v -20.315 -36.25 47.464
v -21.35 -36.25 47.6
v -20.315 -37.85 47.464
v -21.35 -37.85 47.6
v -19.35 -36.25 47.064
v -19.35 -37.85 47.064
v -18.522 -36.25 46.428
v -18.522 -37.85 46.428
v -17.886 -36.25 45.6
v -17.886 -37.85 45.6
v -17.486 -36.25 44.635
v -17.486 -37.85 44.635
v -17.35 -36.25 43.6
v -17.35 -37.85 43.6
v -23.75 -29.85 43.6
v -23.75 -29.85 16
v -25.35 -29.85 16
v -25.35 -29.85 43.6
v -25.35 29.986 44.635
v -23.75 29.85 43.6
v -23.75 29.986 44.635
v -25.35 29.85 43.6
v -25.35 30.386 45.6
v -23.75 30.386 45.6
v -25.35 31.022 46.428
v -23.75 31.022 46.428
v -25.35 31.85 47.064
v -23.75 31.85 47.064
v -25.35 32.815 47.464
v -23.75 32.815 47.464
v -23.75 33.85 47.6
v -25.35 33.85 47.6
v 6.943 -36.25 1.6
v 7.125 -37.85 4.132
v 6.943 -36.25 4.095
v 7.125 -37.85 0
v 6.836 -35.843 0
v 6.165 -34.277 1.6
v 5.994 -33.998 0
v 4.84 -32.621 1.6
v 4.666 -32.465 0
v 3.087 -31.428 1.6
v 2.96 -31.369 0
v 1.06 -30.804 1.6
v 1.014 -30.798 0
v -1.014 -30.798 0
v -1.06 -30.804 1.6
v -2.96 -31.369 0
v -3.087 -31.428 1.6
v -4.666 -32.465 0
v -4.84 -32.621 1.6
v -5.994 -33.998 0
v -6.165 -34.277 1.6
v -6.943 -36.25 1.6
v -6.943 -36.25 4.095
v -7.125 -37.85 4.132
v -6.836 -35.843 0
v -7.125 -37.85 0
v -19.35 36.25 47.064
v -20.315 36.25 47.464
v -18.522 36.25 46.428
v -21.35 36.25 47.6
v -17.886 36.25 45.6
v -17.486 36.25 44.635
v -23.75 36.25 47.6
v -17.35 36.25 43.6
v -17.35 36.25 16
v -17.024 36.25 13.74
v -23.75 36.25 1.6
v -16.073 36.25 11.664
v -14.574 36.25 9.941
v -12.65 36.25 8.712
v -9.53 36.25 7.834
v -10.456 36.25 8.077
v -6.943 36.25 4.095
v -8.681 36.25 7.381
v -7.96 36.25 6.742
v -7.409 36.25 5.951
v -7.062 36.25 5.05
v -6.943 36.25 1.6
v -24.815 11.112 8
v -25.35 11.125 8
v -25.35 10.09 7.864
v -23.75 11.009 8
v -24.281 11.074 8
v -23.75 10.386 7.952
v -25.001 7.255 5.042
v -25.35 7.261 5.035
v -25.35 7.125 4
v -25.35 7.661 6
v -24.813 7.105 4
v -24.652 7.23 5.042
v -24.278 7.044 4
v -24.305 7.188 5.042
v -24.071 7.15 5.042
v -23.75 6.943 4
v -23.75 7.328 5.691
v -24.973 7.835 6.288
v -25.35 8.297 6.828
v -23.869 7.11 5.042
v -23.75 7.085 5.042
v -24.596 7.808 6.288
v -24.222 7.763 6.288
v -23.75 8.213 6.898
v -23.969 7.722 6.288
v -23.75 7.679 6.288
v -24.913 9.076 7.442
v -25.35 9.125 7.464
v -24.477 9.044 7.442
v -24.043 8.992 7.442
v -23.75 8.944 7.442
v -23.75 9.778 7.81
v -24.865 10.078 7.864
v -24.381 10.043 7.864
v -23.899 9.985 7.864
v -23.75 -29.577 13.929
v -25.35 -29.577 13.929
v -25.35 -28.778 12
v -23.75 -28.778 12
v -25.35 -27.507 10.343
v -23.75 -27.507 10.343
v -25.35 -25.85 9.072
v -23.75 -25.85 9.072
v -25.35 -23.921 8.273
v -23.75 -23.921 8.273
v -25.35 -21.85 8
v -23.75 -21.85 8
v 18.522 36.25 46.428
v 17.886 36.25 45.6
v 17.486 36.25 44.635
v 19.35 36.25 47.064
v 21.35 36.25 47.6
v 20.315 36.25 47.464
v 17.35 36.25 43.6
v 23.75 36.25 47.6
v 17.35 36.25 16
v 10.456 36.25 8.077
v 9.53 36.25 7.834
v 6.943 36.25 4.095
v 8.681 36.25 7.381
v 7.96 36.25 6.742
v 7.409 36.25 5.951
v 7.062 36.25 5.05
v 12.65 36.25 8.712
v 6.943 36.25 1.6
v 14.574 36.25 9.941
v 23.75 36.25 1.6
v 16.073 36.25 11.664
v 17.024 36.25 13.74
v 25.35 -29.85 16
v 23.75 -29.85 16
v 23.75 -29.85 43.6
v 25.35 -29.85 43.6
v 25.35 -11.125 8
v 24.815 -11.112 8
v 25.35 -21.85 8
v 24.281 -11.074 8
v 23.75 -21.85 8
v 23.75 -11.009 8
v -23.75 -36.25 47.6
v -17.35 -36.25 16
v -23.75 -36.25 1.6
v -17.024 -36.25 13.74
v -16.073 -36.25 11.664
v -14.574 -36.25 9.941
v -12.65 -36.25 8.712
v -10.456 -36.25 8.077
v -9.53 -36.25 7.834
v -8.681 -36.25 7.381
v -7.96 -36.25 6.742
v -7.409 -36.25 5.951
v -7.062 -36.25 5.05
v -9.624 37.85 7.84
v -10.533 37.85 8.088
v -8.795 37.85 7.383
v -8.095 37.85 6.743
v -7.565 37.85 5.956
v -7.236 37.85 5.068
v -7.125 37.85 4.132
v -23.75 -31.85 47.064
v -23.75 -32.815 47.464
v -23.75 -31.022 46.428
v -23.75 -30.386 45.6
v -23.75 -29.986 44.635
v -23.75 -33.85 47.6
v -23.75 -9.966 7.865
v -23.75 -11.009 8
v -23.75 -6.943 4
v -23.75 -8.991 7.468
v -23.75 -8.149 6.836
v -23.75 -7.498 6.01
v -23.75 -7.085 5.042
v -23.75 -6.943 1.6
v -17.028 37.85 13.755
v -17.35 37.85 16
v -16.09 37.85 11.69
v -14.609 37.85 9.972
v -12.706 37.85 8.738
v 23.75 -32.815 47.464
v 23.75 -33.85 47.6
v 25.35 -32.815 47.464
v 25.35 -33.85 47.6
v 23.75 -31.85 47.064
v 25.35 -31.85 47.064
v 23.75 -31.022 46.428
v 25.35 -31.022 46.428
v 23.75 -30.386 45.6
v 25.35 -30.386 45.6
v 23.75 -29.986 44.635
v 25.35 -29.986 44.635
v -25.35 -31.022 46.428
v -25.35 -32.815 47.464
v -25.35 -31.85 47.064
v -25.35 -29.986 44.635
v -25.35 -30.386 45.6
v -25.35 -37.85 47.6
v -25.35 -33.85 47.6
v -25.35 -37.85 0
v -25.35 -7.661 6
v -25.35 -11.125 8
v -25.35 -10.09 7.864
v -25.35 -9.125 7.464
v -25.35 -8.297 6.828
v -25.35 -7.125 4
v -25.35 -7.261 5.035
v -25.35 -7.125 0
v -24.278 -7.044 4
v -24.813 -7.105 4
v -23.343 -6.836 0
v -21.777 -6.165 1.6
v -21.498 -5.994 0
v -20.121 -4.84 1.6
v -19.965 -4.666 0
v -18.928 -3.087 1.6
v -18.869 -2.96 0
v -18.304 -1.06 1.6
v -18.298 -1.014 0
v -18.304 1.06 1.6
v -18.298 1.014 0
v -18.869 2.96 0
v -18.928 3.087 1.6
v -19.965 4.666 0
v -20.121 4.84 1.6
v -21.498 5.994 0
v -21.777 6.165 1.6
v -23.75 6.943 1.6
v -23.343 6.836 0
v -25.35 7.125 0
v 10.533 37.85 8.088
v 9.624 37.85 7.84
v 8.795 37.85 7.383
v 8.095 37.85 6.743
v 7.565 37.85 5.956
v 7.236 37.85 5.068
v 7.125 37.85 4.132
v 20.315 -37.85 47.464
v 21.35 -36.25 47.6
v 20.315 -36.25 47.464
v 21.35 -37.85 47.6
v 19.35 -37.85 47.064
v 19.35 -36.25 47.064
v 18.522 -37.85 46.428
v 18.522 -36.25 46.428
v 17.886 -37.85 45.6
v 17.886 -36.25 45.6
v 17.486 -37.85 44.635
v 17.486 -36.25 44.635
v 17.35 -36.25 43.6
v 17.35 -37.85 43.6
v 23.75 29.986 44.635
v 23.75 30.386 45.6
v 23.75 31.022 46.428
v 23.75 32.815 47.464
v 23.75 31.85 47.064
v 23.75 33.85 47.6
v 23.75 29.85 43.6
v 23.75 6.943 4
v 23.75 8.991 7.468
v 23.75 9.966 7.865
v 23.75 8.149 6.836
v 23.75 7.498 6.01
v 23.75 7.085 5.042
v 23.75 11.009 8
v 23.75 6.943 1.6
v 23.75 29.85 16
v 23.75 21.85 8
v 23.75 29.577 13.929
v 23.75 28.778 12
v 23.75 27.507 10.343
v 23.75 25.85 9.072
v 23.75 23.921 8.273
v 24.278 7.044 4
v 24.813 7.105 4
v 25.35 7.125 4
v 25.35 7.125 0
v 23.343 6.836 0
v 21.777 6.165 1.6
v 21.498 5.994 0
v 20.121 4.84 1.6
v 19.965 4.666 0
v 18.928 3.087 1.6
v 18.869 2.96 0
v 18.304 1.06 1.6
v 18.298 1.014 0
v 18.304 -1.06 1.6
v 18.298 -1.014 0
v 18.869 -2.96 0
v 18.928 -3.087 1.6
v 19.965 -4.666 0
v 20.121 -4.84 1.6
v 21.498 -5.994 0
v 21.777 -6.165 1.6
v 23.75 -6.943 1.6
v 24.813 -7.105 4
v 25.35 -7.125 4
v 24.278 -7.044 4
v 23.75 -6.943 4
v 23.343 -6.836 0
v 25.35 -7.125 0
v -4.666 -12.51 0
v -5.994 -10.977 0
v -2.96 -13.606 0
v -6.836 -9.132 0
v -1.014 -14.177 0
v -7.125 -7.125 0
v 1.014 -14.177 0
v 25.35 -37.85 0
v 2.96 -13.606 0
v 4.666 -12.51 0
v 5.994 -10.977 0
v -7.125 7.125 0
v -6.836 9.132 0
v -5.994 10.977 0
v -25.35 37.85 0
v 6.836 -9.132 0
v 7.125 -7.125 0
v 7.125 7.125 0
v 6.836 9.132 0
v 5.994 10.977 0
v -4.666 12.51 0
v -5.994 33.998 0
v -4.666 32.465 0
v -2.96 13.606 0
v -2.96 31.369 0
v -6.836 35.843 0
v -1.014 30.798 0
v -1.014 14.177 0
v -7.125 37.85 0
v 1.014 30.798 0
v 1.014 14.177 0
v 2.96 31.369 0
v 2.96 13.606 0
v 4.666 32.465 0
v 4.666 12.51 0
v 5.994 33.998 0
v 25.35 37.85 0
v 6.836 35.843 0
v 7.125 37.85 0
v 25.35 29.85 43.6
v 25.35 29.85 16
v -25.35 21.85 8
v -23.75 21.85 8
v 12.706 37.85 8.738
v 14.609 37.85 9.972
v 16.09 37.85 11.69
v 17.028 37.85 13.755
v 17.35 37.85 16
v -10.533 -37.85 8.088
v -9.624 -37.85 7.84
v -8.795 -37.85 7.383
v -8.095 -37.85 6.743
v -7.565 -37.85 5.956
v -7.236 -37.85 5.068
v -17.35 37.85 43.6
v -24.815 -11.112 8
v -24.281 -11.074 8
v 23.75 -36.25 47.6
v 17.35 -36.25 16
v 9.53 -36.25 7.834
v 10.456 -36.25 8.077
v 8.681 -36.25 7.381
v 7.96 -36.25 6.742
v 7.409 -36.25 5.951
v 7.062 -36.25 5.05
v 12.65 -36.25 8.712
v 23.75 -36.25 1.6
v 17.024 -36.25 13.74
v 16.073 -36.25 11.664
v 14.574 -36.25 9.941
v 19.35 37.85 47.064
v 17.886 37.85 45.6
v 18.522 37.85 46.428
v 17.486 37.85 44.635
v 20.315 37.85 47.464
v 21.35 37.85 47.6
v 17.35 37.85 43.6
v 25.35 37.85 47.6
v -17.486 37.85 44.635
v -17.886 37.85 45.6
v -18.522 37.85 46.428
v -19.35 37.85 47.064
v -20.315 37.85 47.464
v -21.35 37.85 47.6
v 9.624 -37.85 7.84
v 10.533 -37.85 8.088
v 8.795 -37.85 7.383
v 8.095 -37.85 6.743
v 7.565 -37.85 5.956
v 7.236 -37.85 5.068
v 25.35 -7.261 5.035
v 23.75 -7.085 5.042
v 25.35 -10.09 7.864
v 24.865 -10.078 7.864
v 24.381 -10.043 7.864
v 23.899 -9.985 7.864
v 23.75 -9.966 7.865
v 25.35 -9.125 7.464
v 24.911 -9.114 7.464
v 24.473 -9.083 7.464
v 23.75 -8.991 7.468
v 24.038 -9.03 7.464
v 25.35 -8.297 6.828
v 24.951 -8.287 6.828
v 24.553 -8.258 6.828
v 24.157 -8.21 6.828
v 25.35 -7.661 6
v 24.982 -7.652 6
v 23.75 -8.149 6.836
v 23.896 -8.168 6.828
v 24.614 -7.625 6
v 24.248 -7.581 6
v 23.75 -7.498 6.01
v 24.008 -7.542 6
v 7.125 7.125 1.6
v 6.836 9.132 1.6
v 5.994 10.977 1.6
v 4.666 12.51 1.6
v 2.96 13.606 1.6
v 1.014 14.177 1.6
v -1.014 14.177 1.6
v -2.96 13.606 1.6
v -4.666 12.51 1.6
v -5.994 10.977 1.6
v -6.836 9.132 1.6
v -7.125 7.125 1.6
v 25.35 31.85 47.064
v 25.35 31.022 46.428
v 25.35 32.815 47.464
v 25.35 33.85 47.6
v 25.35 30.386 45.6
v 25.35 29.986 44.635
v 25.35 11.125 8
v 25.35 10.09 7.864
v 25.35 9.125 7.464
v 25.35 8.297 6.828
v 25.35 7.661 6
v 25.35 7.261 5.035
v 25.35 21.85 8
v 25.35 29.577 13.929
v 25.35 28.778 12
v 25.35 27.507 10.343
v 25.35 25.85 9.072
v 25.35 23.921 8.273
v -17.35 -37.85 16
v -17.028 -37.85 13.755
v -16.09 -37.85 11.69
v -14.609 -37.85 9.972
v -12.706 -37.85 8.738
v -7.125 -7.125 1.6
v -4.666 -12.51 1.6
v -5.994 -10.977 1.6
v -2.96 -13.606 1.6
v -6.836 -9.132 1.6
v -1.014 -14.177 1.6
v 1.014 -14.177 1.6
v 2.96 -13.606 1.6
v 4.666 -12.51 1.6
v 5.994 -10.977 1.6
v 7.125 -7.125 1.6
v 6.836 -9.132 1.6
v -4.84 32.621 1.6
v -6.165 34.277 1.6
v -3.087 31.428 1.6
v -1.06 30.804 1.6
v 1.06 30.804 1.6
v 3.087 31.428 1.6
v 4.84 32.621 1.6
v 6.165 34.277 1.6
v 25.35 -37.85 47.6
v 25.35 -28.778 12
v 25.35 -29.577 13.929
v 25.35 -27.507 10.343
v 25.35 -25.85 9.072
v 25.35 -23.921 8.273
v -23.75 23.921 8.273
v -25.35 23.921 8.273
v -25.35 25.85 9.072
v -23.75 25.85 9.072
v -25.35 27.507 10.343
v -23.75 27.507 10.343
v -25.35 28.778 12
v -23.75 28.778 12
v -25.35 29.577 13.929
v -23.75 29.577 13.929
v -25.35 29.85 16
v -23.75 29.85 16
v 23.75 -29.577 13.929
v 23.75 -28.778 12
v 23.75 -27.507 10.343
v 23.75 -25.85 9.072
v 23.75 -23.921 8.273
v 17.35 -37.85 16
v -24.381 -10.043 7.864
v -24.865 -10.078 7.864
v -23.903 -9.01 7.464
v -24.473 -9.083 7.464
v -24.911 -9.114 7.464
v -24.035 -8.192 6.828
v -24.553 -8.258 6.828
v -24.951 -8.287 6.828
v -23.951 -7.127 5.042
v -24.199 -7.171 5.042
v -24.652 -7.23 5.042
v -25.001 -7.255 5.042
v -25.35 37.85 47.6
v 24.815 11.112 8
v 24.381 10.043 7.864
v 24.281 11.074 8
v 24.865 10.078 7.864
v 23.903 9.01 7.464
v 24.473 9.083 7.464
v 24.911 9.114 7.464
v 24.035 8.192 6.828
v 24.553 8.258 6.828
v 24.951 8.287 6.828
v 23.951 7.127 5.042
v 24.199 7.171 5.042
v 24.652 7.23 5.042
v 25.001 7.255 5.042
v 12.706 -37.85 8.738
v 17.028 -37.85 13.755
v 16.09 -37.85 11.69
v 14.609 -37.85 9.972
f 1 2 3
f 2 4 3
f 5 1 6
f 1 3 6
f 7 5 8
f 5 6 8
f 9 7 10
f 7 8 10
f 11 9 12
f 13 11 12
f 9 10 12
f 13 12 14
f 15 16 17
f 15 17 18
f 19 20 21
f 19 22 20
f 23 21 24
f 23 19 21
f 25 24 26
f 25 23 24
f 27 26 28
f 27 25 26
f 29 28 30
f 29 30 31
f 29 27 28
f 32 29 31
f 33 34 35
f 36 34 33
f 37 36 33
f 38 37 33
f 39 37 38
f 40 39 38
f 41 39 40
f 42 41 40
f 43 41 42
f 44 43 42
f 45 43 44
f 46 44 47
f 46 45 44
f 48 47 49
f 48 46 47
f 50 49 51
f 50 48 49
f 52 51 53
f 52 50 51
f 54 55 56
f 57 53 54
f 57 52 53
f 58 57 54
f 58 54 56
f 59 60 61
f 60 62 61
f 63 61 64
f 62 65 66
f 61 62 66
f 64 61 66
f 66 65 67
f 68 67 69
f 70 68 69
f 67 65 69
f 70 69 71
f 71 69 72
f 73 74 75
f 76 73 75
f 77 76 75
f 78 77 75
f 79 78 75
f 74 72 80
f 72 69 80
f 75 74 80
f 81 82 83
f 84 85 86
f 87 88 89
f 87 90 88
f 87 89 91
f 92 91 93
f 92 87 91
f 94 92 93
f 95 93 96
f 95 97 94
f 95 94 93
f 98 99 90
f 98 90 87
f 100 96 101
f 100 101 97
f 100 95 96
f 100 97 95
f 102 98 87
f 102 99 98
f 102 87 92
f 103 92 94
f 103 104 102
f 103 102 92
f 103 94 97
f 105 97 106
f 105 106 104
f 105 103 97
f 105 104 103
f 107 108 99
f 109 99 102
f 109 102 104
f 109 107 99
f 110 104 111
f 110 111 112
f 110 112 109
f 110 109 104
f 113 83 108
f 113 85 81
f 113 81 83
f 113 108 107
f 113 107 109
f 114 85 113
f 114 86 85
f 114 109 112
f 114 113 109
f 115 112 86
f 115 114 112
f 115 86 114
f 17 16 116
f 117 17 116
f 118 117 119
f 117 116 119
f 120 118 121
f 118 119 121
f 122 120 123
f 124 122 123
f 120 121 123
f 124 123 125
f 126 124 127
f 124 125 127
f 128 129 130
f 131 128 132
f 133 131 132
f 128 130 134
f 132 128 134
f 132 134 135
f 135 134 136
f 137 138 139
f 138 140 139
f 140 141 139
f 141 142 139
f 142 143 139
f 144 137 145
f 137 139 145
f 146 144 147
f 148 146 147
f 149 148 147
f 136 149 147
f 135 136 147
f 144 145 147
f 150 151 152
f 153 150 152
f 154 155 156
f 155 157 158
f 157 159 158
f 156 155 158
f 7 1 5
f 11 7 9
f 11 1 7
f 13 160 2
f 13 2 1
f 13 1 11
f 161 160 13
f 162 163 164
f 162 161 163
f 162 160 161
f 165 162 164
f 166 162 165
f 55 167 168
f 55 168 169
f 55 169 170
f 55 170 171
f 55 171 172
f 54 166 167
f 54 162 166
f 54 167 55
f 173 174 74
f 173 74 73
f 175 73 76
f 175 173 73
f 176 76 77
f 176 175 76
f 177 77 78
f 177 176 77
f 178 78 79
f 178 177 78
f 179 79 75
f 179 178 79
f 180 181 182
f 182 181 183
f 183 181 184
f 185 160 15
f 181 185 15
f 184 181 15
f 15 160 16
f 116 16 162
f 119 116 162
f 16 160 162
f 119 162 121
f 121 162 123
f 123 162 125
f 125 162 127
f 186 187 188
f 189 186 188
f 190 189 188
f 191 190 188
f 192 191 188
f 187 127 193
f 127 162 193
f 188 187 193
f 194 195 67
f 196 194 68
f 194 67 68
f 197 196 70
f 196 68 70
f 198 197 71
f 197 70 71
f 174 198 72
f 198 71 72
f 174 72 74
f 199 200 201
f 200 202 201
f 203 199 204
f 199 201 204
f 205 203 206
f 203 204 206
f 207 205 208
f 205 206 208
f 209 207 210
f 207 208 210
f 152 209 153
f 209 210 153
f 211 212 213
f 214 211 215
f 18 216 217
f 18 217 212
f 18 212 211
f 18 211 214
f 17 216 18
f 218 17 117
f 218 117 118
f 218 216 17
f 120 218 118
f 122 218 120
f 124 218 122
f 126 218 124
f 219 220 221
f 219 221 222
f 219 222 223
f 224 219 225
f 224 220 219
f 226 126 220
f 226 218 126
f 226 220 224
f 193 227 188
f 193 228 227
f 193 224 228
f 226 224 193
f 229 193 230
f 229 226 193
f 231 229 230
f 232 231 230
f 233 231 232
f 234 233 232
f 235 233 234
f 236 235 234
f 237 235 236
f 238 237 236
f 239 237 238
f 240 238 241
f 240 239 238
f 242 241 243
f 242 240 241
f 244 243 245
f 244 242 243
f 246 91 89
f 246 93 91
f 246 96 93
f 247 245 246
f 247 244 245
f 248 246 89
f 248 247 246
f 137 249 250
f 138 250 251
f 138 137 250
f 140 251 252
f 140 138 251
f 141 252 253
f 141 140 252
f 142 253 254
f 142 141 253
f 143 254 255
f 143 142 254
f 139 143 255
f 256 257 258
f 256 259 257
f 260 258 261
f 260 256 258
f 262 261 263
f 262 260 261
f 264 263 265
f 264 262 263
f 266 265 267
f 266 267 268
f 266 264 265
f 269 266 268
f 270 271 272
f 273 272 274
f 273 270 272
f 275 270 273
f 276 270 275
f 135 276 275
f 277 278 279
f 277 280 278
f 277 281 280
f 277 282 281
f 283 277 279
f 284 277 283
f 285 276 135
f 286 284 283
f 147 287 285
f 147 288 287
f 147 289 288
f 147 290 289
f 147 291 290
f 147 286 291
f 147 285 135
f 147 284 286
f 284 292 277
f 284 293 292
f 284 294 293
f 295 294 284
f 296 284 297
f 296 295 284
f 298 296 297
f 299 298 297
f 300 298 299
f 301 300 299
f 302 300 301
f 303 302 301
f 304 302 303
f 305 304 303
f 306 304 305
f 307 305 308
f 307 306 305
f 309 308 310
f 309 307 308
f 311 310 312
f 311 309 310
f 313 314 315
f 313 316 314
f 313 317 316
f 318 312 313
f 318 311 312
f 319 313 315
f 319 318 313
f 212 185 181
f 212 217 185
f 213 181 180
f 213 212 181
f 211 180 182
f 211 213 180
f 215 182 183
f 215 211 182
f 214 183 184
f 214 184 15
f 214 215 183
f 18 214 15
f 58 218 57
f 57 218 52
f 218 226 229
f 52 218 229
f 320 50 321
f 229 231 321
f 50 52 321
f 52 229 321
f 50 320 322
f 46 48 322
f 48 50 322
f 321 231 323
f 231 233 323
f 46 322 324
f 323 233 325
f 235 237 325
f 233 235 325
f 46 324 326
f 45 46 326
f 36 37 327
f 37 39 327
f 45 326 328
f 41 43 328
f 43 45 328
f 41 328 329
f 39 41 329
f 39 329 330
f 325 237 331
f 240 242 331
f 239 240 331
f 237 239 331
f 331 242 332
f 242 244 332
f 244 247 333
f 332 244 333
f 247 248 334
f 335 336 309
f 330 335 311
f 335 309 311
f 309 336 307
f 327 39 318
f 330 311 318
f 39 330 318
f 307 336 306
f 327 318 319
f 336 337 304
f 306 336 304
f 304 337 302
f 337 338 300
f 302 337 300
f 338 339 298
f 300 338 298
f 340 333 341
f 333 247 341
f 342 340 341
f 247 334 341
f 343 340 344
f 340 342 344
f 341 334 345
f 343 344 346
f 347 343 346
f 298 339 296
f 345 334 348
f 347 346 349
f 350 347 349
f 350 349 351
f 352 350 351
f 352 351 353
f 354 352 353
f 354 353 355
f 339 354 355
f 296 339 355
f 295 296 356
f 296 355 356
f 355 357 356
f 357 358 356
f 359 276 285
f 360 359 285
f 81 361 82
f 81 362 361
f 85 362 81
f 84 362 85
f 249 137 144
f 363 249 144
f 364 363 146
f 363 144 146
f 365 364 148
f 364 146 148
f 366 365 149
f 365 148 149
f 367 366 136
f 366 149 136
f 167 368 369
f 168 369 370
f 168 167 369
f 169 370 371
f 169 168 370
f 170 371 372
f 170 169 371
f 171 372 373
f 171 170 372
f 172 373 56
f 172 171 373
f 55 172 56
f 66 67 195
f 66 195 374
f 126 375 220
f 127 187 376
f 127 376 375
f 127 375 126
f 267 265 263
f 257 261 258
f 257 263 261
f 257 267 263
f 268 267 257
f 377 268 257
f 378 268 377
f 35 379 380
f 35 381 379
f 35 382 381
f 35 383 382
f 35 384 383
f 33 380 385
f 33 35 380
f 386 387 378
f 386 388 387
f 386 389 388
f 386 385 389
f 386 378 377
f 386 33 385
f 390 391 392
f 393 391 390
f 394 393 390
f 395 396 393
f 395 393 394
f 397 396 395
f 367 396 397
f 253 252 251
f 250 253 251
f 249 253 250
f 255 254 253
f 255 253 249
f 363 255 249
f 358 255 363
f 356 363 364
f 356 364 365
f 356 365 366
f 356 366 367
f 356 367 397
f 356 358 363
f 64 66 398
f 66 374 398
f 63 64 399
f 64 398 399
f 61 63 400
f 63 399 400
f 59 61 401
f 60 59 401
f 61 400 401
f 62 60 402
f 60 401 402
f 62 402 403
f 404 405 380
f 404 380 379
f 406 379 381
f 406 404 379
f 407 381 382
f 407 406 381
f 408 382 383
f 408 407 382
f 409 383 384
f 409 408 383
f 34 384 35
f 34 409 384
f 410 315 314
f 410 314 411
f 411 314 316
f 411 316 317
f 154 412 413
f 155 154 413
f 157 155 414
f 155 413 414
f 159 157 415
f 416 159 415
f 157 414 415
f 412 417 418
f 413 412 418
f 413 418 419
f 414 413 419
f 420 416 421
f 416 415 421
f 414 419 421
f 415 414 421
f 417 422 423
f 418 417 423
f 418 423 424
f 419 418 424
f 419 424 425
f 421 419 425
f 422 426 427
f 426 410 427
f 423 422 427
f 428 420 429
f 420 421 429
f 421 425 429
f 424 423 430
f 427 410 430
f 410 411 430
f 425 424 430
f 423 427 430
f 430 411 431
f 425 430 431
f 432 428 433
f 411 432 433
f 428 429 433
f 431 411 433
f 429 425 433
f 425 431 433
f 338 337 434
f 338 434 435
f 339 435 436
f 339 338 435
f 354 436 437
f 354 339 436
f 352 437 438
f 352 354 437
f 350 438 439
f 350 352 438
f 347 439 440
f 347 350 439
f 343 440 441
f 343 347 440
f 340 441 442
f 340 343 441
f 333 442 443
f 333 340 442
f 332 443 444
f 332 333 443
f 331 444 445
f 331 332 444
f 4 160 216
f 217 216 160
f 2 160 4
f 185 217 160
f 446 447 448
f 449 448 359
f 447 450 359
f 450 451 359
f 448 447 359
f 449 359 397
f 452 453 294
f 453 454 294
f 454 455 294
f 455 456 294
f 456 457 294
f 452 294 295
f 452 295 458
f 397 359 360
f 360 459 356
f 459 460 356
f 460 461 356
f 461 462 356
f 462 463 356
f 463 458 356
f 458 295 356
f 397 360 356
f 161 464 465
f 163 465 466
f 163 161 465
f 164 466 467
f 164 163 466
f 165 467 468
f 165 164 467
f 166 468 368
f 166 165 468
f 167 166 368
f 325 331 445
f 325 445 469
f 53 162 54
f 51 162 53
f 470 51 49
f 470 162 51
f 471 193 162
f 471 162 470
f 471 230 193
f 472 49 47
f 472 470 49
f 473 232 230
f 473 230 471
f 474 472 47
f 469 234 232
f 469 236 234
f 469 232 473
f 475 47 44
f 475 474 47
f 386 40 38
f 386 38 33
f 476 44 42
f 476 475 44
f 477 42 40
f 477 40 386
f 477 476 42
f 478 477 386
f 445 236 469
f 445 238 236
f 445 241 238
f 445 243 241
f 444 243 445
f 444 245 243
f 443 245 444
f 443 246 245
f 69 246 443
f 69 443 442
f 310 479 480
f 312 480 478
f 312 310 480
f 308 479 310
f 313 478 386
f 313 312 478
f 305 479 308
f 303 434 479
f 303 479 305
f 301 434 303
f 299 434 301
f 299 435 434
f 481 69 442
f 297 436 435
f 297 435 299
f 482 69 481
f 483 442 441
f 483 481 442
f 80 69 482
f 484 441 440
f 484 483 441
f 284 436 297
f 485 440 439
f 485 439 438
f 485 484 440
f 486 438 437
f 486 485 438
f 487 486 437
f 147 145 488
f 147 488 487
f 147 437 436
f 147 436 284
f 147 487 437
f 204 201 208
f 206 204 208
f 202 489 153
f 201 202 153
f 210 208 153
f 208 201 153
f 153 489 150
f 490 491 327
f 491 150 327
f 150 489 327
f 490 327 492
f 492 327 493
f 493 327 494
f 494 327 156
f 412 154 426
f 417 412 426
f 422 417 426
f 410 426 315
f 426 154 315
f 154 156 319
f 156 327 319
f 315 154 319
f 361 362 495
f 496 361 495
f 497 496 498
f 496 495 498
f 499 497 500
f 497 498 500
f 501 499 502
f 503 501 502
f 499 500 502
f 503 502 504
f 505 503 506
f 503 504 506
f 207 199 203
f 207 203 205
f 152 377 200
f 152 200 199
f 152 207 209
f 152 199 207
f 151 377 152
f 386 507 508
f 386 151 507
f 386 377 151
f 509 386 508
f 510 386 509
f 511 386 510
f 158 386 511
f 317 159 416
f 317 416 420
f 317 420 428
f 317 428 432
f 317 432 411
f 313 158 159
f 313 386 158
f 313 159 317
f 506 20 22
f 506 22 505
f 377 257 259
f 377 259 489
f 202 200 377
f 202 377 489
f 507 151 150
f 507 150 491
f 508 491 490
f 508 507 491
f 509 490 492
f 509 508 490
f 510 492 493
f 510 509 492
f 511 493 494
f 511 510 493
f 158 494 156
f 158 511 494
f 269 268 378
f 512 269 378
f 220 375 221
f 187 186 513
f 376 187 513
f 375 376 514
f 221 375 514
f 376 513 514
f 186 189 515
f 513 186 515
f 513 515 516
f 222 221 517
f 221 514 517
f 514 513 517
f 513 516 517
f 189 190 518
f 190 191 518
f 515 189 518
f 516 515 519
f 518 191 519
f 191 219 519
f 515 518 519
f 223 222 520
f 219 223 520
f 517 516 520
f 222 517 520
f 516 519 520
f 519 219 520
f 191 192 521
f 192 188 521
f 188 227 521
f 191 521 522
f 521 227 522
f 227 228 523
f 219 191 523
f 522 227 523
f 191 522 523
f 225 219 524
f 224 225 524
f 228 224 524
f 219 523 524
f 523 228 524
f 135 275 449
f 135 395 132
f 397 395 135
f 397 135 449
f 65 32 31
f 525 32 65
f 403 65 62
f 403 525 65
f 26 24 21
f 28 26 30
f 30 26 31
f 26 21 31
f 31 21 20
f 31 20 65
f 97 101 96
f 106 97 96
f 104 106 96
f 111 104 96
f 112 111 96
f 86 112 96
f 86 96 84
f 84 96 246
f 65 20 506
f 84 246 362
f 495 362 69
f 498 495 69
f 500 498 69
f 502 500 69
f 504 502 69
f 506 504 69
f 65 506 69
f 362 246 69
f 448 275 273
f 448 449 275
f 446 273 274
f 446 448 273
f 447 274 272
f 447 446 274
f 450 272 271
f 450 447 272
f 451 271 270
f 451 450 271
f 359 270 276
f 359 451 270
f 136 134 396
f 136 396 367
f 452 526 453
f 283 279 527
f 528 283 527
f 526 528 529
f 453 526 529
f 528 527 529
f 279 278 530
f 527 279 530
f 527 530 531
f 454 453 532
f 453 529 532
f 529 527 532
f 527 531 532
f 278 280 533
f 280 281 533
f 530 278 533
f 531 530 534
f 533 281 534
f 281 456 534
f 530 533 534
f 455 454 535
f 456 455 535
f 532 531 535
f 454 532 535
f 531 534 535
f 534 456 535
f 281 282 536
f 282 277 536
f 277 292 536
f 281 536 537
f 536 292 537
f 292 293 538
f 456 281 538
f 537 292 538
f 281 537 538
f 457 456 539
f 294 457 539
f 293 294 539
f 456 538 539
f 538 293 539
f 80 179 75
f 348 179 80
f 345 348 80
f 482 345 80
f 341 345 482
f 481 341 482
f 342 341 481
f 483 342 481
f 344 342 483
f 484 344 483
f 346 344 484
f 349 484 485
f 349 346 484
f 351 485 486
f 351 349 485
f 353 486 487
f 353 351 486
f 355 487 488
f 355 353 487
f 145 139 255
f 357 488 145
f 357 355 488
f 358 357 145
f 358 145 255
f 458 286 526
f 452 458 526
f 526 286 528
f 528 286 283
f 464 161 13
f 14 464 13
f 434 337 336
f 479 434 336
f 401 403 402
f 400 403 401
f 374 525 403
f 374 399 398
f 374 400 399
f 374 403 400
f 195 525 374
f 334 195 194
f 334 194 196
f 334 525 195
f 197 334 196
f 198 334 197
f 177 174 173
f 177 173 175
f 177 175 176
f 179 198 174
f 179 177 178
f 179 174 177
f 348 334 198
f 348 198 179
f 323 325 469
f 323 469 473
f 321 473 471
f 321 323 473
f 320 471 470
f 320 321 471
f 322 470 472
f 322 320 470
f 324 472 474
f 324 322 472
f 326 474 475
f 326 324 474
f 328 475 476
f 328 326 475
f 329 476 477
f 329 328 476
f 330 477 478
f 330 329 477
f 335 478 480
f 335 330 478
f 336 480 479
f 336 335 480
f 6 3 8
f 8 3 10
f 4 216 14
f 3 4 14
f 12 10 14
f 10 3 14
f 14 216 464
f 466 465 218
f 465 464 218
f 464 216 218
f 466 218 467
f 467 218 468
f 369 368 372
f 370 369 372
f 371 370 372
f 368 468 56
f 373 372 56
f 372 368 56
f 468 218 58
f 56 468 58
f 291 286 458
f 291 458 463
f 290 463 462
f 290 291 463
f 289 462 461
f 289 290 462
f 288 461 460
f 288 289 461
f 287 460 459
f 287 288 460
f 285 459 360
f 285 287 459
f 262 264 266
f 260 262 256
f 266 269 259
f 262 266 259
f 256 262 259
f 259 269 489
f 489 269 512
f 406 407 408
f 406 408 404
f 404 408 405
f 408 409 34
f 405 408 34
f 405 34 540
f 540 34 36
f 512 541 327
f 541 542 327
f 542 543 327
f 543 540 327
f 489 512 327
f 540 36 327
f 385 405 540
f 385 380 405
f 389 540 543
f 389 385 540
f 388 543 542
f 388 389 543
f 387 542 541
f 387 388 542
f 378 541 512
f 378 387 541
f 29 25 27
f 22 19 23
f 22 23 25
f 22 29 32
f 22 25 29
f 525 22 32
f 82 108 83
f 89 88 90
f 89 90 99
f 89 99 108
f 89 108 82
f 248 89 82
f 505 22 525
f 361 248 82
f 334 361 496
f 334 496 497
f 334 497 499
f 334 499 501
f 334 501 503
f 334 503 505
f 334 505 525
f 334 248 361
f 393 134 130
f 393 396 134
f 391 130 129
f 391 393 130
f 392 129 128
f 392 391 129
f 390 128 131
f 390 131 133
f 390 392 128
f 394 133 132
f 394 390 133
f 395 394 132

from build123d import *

# Parameters (mm, degrees)
SKETCH008_W          = 50.7
SKETCH008_H          = 75.7
PAD002_DEPTH         = 47.6
THICKNESS002_T       = -1.6
POCKET004_DEPTH      = 37.851
POCKET004_DEPTH_BACK = 37.851
POCKET003_DEPTH      = 25.351
POCKET003_DEPTH_BACK = 25.351
SKETCH006_R          = 7.125
POCKET005_DEPTH      = 0.001
POCKET005_DEPTH_BACK = 47.601
FILLET001_R          = 4


with BuildPart() as part:
    # Sketch008 → Pad002 (new body)
    with BuildSketch(Plane.XY):
        Rectangle(SKETCH008_W, SKETCH008_H)
    extrude(amount=PAD002_DEPTH)

    # Thickness002
    thickness002_openings = [part.faces().sort_by_distance(p)[0] for p in [
        (0, 0, 47.6),
    ]]
    offset(amount=THICKNESS002_T, openings=thickness002_openings, kind=Kind.INTERSECTION)

    # Sketch007 → Pocket004 (cut, two sides)
    with BuildSketch(Plane.XZ) as pocket004_sk:
        with BuildLine():
            Line((-17.35, 47.6), (17.35, 47.6))
            Line((17.35, 47.6), (17.35, 16))
            ThreePointArc((9.35, 8), (15.006854, 10.343146), (17.35, 16))
            Line((9.35, 8), (-9.35, 8))
            ThreePointArc((-17.35, 16), (-15.006854, 10.343146), (-9.35, 8))
            Line((-17.35, 16), (-17.35, 47.6))
        make_face()
    extrude(amount=-POCKET004_DEPTH, mode=Mode.SUBTRACT)
    extrude(pocket004_sk.sketch, amount=POCKET004_DEPTH_BACK, mode=Mode.SUBTRACT)

    # Sketch005 → Pocket003 (cut, two sides)
    with BuildSketch(Plane.YZ) as pocket003_sk:
        with BuildLine():
            Line((-29.85, 47.6), (29.85, 47.6))
            Line((29.85, 47.6), (29.85, 16))
            ThreePointArc((21.85, 8), (27.506854, 10.343146), (29.85, 16))
            Line((21.85, 8), (-21.85, 8))
            ThreePointArc((-29.85, 16), (-27.506854, 10.343146), (-21.85, 8))
            Line((-29.85, 16), (-29.85, 47.6))
        make_face()
    extrude(amount=-POCKET003_DEPTH, mode=Mode.SUBTRACT)
    extrude(pocket003_sk.sketch, amount=POCKET003_DEPTH_BACK, mode=Mode.SUBTRACT)

    # Sketch006 → Pocket005 (cut, two sides)
    with BuildSketch(Plane.XY) as pocket005_sk:
        with Locations((0, 37.85)):
            Circle(SKETCH006_R)
        with Locations((0, -37.85)):
            Circle(SKETCH006_R)
        with Locations((25.35, 0)):
            Circle(SKETCH006_R)
        with Locations((-25.35, 0)):
            Circle(SKETCH006_R)
        with BuildLine():
            ThreePointArc((7.125, 7.125), (0, 14.25), (-7.125, 7.125))
            Line((-7.125, 7.125), (-7.125, -7.125))
            ThreePointArc((-7.125, -7.125), (0, -14.25), (7.125, -7.125))
            Line((7.125, 7.125), (7.125, -7.125))
        make_face()
    extrude(amount=-POCKET005_DEPTH, mode=Mode.SUBTRACT)
    extrude(pocket005_sk.sketch, amount=POCKET005_DEPTH_BACK, mode=Mode.SUBTRACT)

    # Fillet001
    fillet001_edges = [part.edges().sort_by_distance(p)[0] for p in [
        (24.544843, -7.079361, 8),
        (24.544843, 7.079361, 8),
        (24.55, 29.85, 47.6),
        (17.35, 37.05, 47.6),
        (7.079361, 37.044843, 8),
        (-7.079361, 37.044843, 8),
        (-17.35, 37.05, 47.6),
        (-24.55, 29.85, 47.6),
        (-24.544843, 7.079361, 8),
        (-24.544843, -7.079361, 8),
        (-24.55, -29.85, 47.6),
        (-17.35, -37.05, 47.6),
        (-7.079361, -37.044843, 8),
        (7.079361, -37.044843, 8),
        (17.35, -37.05, 47.6),
        (24.55, -29.85, 47.6),
    ]]
    fillet(fillet001_edges, radius=FILLET001_R)


solid = part.part
